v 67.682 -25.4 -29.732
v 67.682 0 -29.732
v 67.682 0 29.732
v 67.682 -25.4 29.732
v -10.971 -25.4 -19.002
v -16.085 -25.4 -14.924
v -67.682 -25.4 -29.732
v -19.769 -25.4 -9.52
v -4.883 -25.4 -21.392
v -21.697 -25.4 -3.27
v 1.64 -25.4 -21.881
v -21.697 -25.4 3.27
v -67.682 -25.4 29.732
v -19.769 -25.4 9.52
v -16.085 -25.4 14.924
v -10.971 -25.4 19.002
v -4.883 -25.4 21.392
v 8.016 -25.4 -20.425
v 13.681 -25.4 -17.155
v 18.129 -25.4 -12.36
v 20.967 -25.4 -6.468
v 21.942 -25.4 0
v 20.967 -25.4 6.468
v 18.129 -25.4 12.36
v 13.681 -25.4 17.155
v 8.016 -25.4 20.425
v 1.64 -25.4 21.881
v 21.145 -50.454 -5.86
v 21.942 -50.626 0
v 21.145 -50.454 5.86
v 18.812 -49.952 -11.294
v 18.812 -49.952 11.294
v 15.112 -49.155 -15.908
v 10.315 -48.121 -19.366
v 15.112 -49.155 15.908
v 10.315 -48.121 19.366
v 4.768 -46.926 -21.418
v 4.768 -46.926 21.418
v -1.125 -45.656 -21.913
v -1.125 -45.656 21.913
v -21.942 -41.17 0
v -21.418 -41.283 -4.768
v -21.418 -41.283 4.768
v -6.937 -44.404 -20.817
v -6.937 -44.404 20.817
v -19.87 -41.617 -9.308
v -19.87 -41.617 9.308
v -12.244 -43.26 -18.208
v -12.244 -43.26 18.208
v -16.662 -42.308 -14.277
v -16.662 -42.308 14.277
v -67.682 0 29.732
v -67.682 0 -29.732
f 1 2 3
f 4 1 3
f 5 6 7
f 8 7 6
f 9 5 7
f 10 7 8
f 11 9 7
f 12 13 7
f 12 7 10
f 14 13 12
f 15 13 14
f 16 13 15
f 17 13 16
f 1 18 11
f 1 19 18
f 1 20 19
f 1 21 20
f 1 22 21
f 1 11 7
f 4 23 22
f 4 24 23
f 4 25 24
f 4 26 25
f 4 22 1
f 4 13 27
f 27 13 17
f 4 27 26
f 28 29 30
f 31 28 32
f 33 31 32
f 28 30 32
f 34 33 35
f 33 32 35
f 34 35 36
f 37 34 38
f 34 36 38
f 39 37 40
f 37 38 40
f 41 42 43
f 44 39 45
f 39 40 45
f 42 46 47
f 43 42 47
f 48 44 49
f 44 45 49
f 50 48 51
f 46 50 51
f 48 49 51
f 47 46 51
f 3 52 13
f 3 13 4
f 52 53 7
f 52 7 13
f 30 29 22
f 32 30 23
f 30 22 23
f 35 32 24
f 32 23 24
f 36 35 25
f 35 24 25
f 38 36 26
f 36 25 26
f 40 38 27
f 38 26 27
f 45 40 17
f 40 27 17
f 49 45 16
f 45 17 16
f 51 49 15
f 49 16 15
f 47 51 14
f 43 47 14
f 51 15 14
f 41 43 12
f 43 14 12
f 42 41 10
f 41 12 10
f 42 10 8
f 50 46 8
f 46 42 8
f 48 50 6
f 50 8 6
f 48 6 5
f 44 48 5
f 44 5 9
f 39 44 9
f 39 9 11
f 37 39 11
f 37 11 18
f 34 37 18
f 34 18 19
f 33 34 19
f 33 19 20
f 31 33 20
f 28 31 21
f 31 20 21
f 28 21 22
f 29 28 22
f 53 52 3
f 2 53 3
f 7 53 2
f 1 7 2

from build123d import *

# Parameters (mm, degrees)
F0_W          = 135.364354
F0_H          = 59.463624
F1_DEPTH      = 25.4
F2_R          = 21.942161
F3_DEPTH      = 25.4
F5_DEPTH      = 25.4
F5_DEPTH_BACK = 25.4


with BuildPart() as f1:
    # F0 (on Front) → F1 (new body)
    with BuildSketch(Plane.XZ):
        Rectangle(F0_W, F0_H)
    extrude(amount=F1_DEPTH)

    # F2 (on face) → F3 (join)
    with BuildSketch(Plane.XZ.offset(25.4)):
        Circle(F2_R)
    extrude(amount=F3_DEPTH)

    # F4 (on Top) → F5 (cut, two sides)
    with BuildSketch(Plane.XY) as f5_sk:
        Polygon((34.163382, -53.259425), (-24.172205, -40.689882), (-24.172205, -53.259425), align=None)
    extrude(amount=F5_DEPTH, mode=Mode.SUBTRACT)
    extrude(f5_sk.sketch, amount=-F5_DEPTH_BACK, mode=Mode.SUBTRACT)


solid = f1.part
